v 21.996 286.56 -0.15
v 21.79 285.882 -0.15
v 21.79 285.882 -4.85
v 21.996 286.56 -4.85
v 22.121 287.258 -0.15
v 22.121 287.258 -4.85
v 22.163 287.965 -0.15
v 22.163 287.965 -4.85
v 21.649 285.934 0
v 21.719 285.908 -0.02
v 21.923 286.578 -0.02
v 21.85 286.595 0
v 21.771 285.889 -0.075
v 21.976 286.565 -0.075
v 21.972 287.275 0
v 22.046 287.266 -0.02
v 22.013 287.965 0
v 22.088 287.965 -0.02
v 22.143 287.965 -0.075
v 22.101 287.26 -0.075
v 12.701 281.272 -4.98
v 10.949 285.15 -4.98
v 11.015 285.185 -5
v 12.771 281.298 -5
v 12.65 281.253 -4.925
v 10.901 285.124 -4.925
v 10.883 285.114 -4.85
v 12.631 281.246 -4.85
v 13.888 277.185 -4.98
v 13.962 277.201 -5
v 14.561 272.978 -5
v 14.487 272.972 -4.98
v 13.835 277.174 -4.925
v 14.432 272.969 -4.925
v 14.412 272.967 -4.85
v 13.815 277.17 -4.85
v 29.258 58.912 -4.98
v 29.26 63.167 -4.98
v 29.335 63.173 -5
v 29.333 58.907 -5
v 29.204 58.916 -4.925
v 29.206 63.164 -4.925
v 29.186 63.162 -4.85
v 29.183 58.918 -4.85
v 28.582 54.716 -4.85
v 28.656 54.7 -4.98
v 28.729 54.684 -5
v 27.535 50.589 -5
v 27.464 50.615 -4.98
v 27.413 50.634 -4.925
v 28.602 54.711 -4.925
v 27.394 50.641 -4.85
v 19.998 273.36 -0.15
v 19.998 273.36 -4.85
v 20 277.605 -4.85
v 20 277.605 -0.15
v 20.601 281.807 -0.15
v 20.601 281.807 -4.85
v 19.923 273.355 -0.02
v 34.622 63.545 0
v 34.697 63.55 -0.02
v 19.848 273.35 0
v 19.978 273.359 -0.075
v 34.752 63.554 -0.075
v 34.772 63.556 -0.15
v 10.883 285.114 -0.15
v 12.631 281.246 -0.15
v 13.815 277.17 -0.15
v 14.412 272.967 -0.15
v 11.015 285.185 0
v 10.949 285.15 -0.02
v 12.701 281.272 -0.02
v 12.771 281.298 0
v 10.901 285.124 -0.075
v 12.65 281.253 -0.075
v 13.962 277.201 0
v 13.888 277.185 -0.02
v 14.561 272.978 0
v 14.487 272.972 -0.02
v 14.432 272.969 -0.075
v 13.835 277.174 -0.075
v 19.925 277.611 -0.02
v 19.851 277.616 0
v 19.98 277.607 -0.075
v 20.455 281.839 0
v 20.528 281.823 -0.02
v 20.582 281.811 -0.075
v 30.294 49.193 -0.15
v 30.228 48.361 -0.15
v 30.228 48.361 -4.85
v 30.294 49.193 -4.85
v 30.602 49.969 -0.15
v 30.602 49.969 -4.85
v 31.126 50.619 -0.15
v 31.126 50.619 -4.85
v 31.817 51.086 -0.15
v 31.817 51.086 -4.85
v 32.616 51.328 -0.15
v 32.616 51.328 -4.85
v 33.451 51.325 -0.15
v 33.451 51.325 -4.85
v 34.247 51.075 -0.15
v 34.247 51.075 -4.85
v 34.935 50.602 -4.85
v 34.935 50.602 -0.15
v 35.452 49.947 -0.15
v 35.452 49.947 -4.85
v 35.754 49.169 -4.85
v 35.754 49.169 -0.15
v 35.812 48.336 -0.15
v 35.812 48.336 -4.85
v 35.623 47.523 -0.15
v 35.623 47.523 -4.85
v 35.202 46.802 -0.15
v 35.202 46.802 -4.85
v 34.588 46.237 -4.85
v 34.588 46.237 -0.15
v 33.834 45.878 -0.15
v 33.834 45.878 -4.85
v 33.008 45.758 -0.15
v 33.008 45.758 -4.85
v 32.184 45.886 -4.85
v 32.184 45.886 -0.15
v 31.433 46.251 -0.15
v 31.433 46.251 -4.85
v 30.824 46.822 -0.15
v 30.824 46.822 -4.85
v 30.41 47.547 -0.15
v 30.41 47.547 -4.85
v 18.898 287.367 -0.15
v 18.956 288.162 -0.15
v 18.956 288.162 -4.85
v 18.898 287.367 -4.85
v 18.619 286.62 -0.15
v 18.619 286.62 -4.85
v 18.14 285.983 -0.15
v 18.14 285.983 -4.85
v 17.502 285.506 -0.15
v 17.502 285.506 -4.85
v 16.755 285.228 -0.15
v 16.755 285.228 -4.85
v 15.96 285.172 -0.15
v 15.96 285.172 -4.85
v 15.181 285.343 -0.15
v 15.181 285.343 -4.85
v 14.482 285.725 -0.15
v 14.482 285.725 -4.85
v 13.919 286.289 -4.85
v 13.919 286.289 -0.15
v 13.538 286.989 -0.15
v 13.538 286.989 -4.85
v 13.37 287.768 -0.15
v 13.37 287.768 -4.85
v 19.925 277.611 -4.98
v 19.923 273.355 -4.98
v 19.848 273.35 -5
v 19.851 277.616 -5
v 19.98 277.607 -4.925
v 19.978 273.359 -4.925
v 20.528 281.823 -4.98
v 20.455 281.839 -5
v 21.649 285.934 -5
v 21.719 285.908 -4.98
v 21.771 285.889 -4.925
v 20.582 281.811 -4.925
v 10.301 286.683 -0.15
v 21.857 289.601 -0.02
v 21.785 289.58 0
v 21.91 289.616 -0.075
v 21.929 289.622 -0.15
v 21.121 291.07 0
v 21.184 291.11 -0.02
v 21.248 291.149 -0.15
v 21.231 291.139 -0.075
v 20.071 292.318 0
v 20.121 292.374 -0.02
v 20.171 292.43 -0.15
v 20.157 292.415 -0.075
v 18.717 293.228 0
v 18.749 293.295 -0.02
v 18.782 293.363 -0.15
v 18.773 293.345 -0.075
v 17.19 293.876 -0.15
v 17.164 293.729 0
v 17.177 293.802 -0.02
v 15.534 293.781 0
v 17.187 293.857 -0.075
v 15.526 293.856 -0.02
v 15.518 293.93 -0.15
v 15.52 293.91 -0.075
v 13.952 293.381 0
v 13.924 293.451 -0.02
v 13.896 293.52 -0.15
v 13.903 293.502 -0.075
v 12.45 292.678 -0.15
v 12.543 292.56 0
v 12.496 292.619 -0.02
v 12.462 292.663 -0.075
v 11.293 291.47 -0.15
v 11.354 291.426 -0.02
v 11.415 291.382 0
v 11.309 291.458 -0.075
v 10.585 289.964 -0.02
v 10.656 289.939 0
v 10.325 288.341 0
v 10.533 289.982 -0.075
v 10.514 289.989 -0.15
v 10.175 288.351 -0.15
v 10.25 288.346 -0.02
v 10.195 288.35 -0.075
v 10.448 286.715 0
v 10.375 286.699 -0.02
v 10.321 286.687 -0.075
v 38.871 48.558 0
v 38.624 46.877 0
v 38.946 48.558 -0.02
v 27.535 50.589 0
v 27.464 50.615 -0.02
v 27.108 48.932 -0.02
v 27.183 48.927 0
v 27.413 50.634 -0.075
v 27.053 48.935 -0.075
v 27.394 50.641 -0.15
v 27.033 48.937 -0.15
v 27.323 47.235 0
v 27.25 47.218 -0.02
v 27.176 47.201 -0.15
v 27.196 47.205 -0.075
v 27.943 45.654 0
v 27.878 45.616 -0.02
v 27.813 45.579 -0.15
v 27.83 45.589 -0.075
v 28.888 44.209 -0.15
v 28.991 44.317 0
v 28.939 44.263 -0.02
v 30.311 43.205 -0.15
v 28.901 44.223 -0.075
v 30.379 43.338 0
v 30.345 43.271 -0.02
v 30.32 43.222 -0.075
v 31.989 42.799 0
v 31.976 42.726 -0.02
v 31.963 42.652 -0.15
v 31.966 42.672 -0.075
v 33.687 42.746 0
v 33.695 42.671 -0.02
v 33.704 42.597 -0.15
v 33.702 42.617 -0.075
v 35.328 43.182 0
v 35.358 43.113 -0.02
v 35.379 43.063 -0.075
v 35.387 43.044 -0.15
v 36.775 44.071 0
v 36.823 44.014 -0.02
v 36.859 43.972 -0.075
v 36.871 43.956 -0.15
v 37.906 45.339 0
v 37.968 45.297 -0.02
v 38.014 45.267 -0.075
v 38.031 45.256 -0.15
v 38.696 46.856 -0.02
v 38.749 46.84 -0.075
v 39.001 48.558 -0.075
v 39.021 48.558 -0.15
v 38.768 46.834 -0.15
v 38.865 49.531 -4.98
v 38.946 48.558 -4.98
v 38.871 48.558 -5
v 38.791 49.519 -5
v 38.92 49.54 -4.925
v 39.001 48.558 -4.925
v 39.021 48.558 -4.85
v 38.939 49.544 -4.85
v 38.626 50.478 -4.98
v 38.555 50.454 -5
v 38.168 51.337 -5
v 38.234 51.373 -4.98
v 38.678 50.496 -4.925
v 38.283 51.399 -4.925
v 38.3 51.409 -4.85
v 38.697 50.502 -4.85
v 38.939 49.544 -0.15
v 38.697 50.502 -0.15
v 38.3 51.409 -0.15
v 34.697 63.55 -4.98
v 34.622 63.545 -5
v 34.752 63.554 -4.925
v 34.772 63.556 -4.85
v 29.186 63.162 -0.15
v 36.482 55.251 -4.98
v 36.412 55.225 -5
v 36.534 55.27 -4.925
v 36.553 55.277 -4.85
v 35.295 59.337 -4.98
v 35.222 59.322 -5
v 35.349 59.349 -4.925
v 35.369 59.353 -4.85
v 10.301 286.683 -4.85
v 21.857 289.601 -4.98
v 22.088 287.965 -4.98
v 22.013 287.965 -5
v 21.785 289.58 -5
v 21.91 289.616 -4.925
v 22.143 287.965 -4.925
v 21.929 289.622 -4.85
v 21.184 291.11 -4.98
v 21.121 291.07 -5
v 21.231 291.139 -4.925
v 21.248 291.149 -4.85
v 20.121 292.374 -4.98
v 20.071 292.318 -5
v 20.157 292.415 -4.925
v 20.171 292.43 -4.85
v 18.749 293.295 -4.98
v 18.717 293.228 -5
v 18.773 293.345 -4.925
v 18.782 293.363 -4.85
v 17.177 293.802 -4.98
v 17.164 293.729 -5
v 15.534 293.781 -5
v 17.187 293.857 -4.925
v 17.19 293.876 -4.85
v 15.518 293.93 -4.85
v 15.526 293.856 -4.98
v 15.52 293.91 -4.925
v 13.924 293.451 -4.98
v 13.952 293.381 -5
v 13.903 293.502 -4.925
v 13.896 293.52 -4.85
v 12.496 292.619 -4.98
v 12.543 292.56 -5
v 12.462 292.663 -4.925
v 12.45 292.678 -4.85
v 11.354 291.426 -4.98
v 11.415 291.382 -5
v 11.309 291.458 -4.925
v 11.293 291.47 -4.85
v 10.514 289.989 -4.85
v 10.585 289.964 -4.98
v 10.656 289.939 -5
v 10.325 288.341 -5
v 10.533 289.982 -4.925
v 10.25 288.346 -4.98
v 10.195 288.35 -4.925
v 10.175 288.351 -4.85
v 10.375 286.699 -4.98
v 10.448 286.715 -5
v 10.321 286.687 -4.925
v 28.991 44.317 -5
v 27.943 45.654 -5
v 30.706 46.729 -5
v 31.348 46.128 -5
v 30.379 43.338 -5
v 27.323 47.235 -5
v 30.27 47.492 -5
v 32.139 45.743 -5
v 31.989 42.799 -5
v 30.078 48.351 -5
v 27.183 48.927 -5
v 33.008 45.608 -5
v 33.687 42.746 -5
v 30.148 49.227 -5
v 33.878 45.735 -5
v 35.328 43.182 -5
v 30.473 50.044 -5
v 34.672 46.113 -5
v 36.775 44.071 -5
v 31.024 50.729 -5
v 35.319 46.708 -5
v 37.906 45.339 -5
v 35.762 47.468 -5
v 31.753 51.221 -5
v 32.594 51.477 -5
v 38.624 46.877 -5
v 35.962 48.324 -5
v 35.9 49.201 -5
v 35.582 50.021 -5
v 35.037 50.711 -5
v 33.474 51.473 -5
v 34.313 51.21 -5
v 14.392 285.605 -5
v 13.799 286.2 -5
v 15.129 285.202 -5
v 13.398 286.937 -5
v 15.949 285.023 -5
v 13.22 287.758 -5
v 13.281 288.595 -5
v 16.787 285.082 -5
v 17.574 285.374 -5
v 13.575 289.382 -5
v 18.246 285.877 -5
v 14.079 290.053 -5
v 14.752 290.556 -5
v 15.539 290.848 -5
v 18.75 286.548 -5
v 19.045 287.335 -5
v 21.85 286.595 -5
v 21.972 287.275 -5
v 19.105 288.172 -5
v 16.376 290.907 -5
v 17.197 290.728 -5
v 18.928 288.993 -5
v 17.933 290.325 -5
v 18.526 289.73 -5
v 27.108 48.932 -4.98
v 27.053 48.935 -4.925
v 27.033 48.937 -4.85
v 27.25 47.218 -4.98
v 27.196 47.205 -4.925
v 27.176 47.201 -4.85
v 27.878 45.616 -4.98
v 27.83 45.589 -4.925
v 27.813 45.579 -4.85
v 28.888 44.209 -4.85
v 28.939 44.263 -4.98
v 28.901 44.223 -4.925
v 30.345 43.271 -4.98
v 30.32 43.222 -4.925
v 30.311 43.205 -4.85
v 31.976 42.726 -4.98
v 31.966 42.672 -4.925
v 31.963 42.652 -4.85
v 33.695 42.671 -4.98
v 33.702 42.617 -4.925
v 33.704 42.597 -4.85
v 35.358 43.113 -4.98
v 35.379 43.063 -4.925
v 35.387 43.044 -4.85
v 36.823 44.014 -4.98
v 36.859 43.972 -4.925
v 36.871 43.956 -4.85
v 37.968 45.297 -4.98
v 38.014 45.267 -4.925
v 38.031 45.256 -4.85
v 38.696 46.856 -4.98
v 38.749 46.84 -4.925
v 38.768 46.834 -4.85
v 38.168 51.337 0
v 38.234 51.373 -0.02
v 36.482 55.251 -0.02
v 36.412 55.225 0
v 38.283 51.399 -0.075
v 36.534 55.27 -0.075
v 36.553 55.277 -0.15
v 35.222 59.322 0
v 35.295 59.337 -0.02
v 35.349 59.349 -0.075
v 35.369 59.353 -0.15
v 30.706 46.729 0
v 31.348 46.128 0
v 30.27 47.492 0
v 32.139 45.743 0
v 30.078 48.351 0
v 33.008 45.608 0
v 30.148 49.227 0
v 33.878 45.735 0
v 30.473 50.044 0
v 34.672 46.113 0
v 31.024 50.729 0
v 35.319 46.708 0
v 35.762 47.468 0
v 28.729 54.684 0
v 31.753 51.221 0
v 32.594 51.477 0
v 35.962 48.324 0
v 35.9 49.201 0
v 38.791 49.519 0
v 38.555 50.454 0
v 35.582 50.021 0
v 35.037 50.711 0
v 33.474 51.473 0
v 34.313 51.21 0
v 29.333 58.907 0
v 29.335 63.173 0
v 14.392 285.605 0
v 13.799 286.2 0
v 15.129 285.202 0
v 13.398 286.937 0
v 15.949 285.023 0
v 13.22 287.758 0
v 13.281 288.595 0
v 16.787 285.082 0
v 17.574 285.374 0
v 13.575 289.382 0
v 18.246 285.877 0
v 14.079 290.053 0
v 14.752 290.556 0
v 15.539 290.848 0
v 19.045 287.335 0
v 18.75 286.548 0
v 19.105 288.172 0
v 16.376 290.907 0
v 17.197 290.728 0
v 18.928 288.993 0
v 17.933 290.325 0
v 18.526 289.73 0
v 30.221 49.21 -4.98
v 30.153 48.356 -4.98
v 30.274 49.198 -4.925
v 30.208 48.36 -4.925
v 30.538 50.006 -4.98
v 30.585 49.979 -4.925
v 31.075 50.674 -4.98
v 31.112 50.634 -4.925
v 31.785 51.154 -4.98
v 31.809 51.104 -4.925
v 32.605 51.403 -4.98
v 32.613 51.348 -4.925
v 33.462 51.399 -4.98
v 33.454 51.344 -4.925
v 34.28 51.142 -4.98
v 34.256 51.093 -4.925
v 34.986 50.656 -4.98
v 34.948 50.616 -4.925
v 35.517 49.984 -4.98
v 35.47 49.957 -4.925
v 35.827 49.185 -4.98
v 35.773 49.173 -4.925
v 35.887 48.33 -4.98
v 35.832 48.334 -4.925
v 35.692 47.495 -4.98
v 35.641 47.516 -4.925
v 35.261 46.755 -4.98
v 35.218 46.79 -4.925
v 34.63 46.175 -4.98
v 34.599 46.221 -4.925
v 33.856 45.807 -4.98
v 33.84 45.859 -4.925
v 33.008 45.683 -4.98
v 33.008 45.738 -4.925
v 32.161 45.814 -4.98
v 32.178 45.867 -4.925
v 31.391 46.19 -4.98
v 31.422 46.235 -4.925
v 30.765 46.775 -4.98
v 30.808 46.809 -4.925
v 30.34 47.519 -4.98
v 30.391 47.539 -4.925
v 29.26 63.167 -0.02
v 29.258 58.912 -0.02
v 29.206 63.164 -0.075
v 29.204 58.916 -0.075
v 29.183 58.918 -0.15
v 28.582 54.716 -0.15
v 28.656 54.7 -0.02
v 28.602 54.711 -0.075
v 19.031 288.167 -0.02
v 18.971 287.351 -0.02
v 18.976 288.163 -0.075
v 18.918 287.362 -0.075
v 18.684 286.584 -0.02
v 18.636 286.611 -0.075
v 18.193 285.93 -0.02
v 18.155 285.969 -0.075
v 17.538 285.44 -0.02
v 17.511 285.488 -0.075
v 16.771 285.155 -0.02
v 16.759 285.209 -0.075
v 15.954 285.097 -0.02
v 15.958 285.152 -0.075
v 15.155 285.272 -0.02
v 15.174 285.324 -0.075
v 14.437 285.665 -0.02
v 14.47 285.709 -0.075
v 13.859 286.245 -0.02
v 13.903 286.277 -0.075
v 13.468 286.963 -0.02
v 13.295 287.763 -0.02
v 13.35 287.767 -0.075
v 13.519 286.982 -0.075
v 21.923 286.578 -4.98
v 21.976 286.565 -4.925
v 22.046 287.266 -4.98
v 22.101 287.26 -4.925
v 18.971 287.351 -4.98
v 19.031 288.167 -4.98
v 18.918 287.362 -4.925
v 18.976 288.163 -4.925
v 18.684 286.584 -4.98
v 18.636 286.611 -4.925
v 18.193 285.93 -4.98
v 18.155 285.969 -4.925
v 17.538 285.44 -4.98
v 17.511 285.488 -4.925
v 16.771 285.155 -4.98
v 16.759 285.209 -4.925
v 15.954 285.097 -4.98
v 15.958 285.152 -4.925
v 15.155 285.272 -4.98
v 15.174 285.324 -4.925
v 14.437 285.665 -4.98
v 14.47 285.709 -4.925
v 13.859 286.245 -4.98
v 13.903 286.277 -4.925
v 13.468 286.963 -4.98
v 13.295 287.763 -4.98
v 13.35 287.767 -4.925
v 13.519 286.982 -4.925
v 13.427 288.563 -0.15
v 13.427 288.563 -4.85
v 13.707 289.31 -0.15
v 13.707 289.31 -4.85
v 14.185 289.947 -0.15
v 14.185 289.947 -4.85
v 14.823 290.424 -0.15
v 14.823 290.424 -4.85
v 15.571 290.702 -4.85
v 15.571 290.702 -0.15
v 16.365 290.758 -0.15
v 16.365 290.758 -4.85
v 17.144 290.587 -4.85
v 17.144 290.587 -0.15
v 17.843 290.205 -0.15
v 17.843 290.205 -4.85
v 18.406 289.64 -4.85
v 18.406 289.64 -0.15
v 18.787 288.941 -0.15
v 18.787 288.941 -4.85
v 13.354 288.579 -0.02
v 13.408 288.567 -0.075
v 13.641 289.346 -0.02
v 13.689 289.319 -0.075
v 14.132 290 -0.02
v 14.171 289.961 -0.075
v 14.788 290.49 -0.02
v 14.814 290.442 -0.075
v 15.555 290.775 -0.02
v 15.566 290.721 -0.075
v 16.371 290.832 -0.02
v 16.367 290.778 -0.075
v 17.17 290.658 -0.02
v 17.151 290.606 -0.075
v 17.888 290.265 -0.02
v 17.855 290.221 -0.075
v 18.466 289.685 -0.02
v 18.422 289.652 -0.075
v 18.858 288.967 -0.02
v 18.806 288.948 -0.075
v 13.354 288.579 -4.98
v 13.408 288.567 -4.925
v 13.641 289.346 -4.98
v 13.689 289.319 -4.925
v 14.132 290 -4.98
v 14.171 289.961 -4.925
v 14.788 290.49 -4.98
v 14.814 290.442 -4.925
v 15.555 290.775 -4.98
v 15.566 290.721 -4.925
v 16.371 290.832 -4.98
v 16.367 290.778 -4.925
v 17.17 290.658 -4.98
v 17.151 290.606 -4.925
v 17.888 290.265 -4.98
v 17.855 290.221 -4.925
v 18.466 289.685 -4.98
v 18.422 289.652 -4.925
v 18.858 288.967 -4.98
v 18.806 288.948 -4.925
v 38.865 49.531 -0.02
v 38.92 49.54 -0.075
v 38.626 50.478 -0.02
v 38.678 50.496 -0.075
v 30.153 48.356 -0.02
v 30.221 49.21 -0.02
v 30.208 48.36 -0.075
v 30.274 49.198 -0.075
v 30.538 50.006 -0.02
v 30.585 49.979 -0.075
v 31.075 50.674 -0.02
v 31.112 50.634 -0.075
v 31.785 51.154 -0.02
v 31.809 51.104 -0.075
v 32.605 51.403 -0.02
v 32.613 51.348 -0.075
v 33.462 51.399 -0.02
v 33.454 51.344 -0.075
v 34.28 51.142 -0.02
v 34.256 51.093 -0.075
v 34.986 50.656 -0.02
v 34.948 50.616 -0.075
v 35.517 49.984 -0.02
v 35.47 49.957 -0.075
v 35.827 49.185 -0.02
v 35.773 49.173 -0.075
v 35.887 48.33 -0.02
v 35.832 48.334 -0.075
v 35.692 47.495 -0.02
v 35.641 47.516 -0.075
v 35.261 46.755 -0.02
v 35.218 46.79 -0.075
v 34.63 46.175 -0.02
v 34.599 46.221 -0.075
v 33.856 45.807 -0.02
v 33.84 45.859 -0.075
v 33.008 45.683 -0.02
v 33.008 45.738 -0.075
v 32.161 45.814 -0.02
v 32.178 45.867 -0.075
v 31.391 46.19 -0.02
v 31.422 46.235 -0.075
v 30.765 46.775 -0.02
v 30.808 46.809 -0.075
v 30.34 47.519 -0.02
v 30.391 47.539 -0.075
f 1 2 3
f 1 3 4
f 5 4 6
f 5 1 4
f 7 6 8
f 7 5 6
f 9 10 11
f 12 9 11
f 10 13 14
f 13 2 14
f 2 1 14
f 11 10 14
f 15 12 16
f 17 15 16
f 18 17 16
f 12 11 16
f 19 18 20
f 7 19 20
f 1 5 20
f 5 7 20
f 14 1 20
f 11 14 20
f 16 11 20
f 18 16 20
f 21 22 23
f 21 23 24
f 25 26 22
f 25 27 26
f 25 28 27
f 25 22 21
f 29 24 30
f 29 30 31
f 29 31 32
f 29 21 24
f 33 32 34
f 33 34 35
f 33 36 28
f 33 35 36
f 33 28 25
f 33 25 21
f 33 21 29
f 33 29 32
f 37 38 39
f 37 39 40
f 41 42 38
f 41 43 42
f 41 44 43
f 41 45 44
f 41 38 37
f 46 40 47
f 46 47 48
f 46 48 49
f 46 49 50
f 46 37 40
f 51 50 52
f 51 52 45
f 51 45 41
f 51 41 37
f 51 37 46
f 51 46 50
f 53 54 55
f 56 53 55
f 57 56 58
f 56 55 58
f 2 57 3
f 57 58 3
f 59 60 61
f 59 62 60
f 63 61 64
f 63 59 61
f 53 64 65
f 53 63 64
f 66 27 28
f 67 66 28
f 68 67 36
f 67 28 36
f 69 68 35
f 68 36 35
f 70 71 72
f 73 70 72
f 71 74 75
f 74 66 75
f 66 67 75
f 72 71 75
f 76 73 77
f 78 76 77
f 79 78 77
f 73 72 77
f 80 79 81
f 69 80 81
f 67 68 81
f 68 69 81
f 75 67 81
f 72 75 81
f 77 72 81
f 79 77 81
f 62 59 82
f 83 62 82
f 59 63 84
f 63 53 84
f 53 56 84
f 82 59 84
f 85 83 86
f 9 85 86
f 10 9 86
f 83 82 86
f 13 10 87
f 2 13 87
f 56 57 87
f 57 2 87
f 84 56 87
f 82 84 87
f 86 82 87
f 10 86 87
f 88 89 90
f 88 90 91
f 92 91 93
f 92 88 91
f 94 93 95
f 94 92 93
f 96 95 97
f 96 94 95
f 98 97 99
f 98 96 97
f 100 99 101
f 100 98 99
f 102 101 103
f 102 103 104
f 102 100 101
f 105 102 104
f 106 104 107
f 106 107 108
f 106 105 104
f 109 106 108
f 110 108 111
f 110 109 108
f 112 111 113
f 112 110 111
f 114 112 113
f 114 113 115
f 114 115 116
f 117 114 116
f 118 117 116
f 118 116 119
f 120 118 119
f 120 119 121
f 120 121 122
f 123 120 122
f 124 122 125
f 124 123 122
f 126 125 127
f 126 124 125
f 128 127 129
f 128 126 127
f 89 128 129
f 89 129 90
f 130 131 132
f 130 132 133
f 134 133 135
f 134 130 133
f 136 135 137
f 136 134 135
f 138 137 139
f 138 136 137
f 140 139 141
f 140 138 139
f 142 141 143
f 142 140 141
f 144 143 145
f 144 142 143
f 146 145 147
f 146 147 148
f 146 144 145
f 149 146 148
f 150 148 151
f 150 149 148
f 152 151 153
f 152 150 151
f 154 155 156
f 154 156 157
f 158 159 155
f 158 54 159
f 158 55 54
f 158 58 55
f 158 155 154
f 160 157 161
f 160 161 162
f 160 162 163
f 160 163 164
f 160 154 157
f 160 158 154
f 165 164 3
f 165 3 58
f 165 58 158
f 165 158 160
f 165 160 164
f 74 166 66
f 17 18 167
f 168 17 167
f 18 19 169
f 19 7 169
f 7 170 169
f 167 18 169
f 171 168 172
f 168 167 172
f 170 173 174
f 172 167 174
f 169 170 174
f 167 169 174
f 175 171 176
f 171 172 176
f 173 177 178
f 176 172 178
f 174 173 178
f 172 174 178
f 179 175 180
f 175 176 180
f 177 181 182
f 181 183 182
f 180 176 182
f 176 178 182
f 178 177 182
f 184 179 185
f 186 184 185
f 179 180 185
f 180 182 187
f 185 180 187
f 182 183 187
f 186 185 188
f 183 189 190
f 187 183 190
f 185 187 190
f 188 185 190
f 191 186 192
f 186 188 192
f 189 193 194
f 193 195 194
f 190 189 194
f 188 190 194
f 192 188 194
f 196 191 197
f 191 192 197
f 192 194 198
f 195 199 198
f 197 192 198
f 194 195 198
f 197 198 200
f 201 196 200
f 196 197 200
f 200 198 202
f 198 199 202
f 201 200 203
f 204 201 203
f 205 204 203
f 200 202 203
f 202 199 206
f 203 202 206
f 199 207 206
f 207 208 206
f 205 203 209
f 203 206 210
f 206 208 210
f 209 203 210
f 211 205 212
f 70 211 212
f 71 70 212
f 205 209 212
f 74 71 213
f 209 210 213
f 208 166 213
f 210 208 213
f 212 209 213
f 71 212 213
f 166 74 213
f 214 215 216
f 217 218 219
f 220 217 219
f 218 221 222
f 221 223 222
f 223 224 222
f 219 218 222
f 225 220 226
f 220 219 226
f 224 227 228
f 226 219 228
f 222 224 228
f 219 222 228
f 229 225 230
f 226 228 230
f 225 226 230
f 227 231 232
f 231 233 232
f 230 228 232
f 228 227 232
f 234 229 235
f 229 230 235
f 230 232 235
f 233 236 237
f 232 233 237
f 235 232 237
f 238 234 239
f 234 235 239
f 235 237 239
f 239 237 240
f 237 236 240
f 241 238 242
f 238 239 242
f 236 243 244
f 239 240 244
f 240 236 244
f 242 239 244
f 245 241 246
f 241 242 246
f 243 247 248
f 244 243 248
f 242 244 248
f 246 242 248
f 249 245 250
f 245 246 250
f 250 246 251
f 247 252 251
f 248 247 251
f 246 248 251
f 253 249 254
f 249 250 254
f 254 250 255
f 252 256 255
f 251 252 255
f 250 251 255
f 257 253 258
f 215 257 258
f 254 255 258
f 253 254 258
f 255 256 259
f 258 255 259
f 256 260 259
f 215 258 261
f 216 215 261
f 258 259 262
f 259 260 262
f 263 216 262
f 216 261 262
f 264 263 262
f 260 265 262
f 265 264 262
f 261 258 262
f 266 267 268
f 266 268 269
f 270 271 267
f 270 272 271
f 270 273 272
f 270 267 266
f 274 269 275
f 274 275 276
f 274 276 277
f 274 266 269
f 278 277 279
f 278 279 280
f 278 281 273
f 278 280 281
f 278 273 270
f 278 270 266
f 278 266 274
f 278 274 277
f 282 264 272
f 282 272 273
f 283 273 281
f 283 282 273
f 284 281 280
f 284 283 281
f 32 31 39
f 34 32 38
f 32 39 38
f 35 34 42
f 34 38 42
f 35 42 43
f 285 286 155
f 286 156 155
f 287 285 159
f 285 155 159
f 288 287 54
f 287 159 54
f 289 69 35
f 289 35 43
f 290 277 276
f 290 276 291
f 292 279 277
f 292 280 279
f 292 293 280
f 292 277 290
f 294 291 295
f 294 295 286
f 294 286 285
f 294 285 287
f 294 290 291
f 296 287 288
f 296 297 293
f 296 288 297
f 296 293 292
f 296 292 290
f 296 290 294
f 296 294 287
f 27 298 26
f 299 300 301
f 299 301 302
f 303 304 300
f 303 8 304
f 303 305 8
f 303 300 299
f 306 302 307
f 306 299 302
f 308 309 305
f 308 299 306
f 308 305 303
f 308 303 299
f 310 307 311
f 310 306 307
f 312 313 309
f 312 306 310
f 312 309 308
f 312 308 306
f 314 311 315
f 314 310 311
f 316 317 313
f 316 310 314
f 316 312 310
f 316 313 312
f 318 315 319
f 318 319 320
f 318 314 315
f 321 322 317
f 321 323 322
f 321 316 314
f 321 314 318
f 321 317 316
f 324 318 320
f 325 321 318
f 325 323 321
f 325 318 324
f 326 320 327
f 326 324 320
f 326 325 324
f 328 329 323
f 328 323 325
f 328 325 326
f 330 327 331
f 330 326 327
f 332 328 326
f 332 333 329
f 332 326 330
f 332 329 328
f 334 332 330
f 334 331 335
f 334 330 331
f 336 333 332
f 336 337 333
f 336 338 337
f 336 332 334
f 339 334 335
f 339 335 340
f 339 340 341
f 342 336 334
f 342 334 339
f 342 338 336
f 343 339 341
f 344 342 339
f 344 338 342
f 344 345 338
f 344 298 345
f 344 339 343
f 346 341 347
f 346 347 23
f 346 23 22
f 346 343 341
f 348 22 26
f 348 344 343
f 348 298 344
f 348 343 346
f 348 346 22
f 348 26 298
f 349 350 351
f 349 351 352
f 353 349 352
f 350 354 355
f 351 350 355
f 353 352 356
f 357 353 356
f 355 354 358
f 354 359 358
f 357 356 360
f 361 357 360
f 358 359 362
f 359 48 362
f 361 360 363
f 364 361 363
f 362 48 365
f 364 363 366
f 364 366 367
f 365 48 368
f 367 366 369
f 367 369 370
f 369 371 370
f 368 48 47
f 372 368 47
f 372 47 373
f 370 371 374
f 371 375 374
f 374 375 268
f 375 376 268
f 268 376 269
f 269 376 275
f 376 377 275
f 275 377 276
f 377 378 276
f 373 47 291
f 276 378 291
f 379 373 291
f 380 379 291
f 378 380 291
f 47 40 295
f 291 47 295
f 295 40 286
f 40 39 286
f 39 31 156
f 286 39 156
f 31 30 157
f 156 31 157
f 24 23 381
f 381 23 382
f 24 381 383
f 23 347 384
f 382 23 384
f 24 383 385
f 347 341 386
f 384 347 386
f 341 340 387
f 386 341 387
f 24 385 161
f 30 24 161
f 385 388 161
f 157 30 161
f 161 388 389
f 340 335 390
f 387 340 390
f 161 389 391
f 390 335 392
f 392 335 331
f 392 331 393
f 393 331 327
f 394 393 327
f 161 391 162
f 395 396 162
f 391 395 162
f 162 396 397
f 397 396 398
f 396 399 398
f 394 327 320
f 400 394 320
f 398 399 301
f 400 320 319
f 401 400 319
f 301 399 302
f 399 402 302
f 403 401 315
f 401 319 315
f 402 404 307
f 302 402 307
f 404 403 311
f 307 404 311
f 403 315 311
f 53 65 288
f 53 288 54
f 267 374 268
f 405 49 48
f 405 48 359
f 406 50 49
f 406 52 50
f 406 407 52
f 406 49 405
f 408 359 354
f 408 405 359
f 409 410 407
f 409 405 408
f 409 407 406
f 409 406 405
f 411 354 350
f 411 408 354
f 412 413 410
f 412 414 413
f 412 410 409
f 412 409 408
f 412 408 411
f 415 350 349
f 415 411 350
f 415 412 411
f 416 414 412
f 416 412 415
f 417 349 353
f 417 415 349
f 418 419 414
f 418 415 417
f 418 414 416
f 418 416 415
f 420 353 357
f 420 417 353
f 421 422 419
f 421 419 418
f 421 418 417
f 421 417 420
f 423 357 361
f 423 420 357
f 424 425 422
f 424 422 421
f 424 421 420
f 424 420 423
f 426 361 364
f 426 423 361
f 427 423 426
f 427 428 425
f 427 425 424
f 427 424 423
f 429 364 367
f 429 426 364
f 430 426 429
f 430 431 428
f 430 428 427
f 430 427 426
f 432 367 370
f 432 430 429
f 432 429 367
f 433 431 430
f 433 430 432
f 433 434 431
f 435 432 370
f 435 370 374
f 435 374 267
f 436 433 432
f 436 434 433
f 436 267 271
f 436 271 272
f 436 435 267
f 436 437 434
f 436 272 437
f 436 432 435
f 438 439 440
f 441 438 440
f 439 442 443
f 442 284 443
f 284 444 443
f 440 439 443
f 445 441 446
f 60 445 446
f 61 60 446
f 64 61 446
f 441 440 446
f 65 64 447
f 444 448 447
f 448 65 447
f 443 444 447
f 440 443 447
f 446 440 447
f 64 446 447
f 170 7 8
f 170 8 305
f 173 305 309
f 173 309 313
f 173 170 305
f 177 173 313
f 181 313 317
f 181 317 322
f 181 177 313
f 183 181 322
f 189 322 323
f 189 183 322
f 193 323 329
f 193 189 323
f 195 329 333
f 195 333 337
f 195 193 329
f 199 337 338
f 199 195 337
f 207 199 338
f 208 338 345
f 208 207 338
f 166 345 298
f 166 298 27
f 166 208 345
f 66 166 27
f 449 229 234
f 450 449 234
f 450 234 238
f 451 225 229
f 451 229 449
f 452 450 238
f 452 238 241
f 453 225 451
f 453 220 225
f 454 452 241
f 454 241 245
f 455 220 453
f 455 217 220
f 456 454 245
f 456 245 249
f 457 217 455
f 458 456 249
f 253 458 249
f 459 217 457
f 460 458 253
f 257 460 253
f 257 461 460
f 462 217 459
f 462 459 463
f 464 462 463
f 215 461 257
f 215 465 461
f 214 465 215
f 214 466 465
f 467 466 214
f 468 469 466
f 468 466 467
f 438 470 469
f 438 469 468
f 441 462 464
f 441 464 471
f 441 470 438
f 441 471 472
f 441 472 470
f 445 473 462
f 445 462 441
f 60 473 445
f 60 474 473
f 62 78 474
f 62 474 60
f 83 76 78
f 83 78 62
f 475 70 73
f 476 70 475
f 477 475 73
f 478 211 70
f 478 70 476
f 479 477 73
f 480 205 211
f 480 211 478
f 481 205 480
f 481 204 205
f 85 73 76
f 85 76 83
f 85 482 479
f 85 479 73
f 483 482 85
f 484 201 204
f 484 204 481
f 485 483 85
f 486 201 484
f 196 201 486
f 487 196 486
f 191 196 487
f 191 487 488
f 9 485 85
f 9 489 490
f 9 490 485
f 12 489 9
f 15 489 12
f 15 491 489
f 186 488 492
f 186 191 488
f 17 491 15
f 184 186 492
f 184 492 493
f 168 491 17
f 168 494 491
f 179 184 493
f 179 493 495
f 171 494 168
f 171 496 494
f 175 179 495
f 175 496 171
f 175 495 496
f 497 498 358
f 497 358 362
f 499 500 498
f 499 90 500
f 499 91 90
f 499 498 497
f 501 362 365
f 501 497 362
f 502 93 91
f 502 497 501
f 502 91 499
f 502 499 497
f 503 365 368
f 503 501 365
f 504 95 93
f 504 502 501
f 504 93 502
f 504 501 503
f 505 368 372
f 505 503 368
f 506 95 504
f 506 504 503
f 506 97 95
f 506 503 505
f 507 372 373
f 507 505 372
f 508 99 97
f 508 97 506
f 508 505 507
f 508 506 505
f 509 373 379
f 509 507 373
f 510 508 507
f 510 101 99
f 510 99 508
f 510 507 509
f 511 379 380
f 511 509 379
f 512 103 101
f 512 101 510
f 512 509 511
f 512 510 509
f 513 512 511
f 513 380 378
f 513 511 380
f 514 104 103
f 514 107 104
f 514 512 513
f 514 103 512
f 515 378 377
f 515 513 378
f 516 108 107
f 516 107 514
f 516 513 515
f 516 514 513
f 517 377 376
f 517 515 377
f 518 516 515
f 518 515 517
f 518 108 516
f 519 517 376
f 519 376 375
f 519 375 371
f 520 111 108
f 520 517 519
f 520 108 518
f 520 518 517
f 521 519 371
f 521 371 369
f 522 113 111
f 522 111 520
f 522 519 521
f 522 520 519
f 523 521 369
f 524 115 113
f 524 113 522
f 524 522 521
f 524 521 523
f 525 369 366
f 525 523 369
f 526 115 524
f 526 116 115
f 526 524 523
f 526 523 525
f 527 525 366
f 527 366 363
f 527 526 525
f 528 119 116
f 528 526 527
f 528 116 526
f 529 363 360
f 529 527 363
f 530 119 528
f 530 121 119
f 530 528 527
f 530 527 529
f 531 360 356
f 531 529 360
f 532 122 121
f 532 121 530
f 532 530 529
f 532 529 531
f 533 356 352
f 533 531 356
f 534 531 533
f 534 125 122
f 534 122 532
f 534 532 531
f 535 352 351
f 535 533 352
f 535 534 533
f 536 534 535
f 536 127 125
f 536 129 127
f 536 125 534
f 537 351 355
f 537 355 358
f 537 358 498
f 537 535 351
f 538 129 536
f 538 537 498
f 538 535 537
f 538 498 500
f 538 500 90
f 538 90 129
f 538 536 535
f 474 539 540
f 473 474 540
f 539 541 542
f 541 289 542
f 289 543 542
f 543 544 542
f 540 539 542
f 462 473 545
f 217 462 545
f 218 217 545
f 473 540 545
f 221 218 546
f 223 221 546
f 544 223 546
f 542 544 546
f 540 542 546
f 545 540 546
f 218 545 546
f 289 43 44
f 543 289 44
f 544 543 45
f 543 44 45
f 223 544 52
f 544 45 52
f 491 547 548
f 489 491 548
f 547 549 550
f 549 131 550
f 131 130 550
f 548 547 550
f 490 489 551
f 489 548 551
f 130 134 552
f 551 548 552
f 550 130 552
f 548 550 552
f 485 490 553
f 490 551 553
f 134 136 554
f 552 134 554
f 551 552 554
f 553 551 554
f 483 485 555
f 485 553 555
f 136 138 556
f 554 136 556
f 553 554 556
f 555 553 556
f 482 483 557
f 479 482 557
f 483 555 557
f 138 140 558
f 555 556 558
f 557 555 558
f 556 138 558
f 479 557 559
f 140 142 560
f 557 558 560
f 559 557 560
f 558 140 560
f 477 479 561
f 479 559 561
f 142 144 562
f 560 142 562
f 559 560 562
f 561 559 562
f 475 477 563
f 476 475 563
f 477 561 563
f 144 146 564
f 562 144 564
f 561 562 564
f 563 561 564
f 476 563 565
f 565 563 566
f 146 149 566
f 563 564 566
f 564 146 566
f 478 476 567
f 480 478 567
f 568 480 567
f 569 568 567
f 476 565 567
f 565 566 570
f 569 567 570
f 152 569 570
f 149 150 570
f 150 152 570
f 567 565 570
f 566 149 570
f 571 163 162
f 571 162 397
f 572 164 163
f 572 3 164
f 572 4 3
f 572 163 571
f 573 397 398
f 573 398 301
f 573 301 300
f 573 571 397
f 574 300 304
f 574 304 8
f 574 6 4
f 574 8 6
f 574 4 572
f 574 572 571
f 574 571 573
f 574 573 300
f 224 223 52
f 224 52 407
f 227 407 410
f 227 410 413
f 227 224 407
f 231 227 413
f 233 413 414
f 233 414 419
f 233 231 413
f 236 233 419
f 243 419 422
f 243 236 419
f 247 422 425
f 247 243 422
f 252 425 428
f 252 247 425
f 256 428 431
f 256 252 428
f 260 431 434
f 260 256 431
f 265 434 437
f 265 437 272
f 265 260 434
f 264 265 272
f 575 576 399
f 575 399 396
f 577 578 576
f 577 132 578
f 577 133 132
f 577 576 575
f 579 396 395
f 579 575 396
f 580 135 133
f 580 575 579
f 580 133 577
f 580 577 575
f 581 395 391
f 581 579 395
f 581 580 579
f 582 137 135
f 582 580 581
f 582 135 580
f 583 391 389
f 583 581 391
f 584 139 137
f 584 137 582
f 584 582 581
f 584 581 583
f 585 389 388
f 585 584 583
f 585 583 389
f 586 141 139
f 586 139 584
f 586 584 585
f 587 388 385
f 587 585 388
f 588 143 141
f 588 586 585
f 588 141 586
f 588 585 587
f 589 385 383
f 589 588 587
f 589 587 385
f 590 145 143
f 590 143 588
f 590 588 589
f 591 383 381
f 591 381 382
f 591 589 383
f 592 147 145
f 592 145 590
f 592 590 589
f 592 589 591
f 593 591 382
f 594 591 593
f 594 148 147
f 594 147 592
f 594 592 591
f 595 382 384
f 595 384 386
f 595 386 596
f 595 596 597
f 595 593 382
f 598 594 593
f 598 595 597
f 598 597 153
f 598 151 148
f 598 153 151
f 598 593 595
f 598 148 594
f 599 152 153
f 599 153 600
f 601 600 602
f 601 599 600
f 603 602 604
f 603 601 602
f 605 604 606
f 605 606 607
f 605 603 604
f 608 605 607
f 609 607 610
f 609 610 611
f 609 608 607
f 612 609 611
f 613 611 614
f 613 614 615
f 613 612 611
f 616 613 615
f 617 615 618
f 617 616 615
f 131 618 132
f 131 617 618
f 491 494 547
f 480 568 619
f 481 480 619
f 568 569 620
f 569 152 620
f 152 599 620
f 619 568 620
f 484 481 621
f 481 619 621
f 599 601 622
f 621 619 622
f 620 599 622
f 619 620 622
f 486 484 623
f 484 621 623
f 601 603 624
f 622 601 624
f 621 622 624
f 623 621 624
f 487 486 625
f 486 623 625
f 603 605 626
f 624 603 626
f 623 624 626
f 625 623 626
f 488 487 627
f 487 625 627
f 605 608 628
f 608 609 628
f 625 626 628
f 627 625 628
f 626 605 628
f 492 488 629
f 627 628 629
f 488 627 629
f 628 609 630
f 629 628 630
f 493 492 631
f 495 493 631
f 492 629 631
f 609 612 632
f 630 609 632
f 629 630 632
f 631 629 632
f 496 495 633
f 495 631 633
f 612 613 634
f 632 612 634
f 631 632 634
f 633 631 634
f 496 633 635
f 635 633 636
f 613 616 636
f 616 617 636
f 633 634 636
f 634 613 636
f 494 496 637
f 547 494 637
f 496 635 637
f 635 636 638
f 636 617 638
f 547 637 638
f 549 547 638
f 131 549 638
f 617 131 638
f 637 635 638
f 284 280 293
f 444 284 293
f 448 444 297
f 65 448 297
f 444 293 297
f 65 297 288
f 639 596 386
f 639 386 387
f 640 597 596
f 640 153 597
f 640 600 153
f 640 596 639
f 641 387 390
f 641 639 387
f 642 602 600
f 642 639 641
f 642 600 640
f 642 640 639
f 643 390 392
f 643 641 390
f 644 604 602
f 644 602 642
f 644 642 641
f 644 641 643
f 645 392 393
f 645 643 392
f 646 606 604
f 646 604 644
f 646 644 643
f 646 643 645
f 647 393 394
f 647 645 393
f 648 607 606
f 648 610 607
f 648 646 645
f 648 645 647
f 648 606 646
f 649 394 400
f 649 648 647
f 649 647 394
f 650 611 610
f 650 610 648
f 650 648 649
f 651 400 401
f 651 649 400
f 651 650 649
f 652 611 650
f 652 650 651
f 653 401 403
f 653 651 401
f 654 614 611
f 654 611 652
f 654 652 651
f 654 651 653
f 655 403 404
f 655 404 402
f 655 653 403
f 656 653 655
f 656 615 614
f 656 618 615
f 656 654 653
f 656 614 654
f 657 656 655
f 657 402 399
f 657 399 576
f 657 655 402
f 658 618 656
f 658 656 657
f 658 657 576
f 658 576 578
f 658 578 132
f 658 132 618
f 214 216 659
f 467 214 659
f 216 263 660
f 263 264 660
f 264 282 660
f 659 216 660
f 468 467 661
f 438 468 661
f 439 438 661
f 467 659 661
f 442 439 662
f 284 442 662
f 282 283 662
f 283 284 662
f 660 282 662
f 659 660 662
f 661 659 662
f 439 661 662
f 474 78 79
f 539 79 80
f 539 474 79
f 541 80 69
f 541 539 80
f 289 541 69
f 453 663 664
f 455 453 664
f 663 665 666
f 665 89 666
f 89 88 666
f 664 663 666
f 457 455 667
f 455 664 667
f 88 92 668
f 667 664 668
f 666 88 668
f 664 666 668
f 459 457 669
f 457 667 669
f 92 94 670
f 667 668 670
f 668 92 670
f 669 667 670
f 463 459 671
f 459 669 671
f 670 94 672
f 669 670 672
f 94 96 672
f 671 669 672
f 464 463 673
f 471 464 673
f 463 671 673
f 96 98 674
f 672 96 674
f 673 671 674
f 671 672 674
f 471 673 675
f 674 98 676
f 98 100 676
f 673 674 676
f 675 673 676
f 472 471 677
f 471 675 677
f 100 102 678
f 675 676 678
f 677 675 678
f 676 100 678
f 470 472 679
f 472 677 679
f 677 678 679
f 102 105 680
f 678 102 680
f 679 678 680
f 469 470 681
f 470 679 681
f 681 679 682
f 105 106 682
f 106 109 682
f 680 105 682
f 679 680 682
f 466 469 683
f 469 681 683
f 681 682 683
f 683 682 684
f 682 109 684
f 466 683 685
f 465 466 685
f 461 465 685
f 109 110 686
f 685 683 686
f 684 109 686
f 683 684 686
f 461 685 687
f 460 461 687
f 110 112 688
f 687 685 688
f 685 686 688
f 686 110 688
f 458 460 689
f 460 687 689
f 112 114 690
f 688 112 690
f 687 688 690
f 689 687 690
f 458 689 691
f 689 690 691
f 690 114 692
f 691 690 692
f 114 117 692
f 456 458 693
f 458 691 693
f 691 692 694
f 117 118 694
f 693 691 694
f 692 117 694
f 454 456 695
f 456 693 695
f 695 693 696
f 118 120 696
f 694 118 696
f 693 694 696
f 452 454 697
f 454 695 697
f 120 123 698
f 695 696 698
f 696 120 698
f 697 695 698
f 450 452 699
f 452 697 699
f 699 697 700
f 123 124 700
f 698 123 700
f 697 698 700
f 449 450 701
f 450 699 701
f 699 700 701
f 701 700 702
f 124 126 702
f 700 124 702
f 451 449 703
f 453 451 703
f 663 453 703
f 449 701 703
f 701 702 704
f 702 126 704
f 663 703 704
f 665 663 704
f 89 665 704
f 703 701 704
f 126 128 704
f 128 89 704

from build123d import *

# Parameters (mm, degrees)
BOSS_EXTRUDE1_DEPTH = 5
FILLET1_R           = 30
FILLET2_R           = 0.15


with BuildPart() as part:
    # Sketch1 → Boss-Extrude1 (new body)
    with BuildSketch(Plane.XY):
        with BuildLine():
            ThreePointArc((22.162679097, 287.964927424), (12.885637759, 292.990959663), (13.742345741, 282.47475562))
            Line((13.742345741, 282.47475562), (13.369595311, 287.768247578))
            ThreePointArc((13.369595311, 287.768247578), (15.965999252, 290.758011211), (18.955762884, 288.16160727))
            Line((18.955762884, 288.16160727), (19.328513314, 282.868115311))
            ThreePointArc((19.328513314, 282.868115311), (21.40648522, 285.049023216), (22.162679097, 287.964927424))
        make_face()
        with BuildLine():
            Line((13.369595311, 287.768247578), (13.742345741, 282.47475562))
            ThreePointArc((13.742345741, 282.47475562), (16.58413591, 281.979747882), (19.328513314, 282.868115311))
            Line((19.328513314, 282.868115311), (18.955762884, 288.16160727))
            ThreePointArc((18.955762884, 288.16160727), (16.359358943, 285.171843638), (13.369595311, 287.768247578))
        make_face()
        with BuildLine():
            ThreePointArc((35.814035392, 48.754425573), (33.217631451, 45.764661941), (30.227867819, 48.361065881))
            Line((30.227867819, 48.361065881), (29.855117389, 53.65455784))
            ThreePointArc((29.855117389, 53.65455784), (30.105047397, 43.313939605), (39.020951605, 48.557745727))
            ThreePointArc((39.020951605, 48.557745727), (38.046983844, 51.834787065), (35.441284962, 54.047917532))
            Line((35.441284962, 54.047917532), (35.814035392, 48.754425573))
        make_face()
        with BuildLine():
            Line((29.855117389, 53.65455784), (30.227867819, 48.361065881))
            ThreePointArc((30.227867819, 48.361065881), (32.824271759, 51.350829514), (35.814035392, 48.754425573))
            Line((35.814035392, 48.754425573), (35.441284962, 54.047917532))
            ThreePointArc((35.441284962, 54.047917532), (32.599494793, 54.54292527), (29.855117389, 53.65455784))
        make_face()
        with BuildLine():
            Line((13.742345741, 282.47475562), (29.855117389, 53.65455784))
            ThreePointArc((29.855117389, 53.65455784), (32.599494793, 54.54292527), (35.441284962, 54.047917532))
            Line((35.441284962, 54.047917532), (19.328513314, 282.868115311))
            ThreePointArc((19.328513314, 282.868115311), (16.58413591, 281.979747882), (13.742345741, 282.47475562))
        make_face()
    extrude(amount=-BOSS_EXTRUDE1_DEPTH)

    # Fillet1
    fillet1_edges = [part.edges().sort_by_distance(p)[0] for p in [
        (29.855117389, 53.65455784, -2.5),
        (13.742345741, 282.47475562, -2.5),
        (19.328513314, 282.868115311, -2.5),
        (35.441284962, 54.047917532, -2.5),
    ]]
    fillet(fillet1_edges, radius=FILLET1_R)

    # Fillet2
    fillet2_edges = [part.edges().sort_by_distance(p)[0] for p in [
        (27.384899138, 168.458016422, 0),
        (27.384899138, 168.458016422, -5),
        (15.741222285, 293.950106967, 0),
        (15.741222285, 293.950106967, -5),
        (18.955762884, 288.16160727, -5),
        (21.798731565, 168.06465673, 0),
        (21.798731565, 168.06465673, -5),
        (31.962941543, 42.651764462, 0),
        (31.962941543, 42.651764462, -5),
        (20.226334284, 279.716762081, 0),
        (20.226334284, 279.716762081, -5),
        (13.295010771, 279.228680898, 0),
        (35.814035392, 48.754425573, -5),
        (13.295010771, 279.228680898, -5),
        (28.957296418, 56.80591107, 0),
        (28.957296418, 56.80591107, -5),
        (35.888619932, 57.293992254, 0),
        (35.888619932, 57.293992254, -5),
        (35.814035392, 48.754425573, 0),
        (18.955762884, 288.16160727, 0),
    ]]
    fillet(fillet2_edges, radius=FILLET2_R)


solid = part.part
